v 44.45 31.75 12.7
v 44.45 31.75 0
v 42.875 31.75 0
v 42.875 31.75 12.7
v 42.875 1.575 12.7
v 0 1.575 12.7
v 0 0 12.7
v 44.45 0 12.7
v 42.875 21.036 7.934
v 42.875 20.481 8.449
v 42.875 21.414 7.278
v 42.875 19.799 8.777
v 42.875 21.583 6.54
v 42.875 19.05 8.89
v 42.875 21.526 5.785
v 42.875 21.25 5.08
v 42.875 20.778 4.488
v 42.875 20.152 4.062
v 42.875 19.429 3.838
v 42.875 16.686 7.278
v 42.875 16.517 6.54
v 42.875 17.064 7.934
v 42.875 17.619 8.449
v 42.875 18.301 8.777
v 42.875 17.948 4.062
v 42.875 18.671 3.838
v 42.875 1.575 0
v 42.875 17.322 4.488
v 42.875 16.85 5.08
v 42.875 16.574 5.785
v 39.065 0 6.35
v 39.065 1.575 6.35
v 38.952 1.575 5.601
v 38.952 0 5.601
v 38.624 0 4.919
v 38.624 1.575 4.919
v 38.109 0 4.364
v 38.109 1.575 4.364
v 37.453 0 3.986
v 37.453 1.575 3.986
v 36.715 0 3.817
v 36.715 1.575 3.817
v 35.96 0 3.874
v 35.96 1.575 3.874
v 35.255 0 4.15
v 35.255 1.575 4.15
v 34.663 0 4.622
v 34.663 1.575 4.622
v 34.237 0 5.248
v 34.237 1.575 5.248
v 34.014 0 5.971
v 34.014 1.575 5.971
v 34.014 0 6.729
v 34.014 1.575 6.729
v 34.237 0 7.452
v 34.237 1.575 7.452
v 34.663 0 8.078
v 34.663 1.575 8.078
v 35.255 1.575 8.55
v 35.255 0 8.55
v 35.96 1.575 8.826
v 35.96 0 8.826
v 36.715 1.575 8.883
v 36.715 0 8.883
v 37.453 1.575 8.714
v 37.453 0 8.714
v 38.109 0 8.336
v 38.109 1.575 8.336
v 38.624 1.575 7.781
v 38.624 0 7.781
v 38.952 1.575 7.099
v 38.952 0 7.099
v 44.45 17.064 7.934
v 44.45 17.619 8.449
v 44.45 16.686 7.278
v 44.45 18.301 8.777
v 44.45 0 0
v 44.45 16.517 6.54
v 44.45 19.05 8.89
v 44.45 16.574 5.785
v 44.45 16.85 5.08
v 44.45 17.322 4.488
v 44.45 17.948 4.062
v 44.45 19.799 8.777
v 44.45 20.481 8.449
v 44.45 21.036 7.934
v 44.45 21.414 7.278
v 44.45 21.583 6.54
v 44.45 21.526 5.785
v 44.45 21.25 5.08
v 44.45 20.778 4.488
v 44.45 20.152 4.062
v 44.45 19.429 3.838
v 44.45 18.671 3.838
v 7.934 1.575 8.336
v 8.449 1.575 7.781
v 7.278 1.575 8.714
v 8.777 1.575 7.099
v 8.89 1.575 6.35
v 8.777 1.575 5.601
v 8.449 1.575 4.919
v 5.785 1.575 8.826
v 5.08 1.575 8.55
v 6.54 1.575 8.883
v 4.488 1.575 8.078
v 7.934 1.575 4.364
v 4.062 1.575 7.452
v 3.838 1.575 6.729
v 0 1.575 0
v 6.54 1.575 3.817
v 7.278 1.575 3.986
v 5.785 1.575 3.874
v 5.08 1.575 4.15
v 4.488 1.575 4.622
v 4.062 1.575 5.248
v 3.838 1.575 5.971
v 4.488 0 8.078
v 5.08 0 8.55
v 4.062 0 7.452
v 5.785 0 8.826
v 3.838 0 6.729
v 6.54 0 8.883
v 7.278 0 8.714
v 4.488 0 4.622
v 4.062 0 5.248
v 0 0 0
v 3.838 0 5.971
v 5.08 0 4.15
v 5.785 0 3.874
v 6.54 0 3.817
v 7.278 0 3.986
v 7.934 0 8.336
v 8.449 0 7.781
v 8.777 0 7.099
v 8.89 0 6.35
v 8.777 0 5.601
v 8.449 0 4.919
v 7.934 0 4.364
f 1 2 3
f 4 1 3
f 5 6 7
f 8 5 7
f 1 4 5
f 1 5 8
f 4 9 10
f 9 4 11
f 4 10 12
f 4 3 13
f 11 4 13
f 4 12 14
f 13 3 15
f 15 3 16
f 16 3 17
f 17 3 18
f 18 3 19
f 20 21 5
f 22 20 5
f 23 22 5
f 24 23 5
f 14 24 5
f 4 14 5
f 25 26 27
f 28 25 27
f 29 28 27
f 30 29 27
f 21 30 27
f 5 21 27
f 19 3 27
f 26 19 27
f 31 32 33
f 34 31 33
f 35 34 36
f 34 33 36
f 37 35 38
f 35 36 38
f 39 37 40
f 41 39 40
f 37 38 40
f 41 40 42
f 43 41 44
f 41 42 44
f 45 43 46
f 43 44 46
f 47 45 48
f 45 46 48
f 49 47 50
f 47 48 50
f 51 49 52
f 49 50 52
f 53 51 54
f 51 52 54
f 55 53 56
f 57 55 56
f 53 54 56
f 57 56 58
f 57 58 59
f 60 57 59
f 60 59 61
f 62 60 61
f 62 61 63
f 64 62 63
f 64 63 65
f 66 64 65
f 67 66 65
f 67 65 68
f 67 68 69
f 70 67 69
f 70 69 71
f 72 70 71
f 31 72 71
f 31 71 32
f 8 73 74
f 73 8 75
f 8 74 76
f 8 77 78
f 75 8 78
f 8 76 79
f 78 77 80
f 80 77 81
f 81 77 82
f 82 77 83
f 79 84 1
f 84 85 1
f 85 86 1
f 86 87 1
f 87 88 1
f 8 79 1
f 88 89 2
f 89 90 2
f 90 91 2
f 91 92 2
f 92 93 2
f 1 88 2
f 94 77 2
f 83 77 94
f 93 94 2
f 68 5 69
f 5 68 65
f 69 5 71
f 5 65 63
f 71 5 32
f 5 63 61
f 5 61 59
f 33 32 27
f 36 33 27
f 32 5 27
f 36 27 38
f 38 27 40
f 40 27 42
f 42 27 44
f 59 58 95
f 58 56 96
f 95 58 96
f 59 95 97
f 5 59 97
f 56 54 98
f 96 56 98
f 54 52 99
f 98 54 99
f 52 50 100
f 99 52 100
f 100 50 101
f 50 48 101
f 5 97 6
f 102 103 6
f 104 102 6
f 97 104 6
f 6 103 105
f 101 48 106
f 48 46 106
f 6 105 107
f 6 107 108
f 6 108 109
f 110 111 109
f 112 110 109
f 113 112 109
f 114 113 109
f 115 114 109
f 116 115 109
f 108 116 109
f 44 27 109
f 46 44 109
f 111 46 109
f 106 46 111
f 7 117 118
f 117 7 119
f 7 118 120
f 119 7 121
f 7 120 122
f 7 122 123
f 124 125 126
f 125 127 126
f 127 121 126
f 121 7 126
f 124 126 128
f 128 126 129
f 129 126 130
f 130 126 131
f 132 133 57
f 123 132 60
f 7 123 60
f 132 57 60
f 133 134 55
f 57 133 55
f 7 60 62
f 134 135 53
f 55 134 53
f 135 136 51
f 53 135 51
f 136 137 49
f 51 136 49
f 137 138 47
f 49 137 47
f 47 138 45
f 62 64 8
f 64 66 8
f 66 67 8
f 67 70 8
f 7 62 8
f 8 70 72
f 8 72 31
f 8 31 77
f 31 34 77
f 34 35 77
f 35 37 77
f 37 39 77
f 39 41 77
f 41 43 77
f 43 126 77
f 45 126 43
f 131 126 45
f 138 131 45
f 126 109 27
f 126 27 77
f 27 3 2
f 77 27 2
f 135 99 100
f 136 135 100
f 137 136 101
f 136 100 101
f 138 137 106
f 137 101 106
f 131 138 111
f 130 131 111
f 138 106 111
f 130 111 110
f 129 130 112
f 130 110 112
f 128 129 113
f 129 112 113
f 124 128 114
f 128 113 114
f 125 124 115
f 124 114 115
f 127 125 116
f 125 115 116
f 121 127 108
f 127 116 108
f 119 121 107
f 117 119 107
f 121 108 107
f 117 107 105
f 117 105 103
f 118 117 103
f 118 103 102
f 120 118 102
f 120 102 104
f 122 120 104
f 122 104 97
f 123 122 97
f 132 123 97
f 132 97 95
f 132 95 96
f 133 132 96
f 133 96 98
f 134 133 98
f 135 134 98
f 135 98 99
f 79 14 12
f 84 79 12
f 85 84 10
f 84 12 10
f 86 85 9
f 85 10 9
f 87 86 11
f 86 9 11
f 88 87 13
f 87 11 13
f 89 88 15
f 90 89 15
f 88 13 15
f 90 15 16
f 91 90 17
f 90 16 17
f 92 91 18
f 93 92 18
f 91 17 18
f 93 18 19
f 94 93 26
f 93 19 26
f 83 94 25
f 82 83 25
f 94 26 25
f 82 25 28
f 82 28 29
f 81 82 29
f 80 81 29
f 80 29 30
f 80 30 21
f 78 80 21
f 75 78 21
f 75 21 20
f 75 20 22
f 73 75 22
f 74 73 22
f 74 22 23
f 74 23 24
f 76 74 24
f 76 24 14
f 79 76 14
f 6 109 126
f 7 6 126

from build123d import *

# Parameters (mm, degrees)
BOSS_EXTRUDE1_DEPTH = 12.7
SKETCH2_R           = 2.54
CUT_EXTRUDE1_DEPTH  = 2.5748
SKETCH3_R           = 2.54
CUT_EXTRUDE2_DEPTH  = 2.5748


with BuildPart() as part:
    # Sketch1 → Boss-Extrude1 (new body)
    with BuildSketch(Plane.XY):
        Polygon((0, 0), (44.45, 0), (44.45, 31.75), (42.8752, 31.75), (42.8752, 1.5748), (0, 1.5748), align=None)
    extrude(amount=BOSS_EXTRUDE1_DEPTH)

    # Sketch2 → Cut-Extrude1 (cut, through all)
    with BuildSketch(Plane.ZY.offset(-42.8752)):
        with Locations((6.35, 19.05)):
            Circle(SKETCH2_R)
    extrude(amount=-CUT_EXTRUDE1_DEPTH, mode=Mode.SUBTRACT)

    # Sketch3 → Cut-Extrude2 (cut, through all)
    with BuildSketch(Plane(origin=(0, 1.5748, 0), x_dir=(1, 0, 0), z_dir=(0, 1, 0))):
        with Locations((6.35, -6.35)):
            Circle(SKETCH3_R)
        with Locations((36.5252, -6.35)):
            Circle(SKETCH3_R)
    extrude(amount=-CUT_EXTRUDE2_DEPTH, mode=Mode.SUBTRACT)


solid = part.part
